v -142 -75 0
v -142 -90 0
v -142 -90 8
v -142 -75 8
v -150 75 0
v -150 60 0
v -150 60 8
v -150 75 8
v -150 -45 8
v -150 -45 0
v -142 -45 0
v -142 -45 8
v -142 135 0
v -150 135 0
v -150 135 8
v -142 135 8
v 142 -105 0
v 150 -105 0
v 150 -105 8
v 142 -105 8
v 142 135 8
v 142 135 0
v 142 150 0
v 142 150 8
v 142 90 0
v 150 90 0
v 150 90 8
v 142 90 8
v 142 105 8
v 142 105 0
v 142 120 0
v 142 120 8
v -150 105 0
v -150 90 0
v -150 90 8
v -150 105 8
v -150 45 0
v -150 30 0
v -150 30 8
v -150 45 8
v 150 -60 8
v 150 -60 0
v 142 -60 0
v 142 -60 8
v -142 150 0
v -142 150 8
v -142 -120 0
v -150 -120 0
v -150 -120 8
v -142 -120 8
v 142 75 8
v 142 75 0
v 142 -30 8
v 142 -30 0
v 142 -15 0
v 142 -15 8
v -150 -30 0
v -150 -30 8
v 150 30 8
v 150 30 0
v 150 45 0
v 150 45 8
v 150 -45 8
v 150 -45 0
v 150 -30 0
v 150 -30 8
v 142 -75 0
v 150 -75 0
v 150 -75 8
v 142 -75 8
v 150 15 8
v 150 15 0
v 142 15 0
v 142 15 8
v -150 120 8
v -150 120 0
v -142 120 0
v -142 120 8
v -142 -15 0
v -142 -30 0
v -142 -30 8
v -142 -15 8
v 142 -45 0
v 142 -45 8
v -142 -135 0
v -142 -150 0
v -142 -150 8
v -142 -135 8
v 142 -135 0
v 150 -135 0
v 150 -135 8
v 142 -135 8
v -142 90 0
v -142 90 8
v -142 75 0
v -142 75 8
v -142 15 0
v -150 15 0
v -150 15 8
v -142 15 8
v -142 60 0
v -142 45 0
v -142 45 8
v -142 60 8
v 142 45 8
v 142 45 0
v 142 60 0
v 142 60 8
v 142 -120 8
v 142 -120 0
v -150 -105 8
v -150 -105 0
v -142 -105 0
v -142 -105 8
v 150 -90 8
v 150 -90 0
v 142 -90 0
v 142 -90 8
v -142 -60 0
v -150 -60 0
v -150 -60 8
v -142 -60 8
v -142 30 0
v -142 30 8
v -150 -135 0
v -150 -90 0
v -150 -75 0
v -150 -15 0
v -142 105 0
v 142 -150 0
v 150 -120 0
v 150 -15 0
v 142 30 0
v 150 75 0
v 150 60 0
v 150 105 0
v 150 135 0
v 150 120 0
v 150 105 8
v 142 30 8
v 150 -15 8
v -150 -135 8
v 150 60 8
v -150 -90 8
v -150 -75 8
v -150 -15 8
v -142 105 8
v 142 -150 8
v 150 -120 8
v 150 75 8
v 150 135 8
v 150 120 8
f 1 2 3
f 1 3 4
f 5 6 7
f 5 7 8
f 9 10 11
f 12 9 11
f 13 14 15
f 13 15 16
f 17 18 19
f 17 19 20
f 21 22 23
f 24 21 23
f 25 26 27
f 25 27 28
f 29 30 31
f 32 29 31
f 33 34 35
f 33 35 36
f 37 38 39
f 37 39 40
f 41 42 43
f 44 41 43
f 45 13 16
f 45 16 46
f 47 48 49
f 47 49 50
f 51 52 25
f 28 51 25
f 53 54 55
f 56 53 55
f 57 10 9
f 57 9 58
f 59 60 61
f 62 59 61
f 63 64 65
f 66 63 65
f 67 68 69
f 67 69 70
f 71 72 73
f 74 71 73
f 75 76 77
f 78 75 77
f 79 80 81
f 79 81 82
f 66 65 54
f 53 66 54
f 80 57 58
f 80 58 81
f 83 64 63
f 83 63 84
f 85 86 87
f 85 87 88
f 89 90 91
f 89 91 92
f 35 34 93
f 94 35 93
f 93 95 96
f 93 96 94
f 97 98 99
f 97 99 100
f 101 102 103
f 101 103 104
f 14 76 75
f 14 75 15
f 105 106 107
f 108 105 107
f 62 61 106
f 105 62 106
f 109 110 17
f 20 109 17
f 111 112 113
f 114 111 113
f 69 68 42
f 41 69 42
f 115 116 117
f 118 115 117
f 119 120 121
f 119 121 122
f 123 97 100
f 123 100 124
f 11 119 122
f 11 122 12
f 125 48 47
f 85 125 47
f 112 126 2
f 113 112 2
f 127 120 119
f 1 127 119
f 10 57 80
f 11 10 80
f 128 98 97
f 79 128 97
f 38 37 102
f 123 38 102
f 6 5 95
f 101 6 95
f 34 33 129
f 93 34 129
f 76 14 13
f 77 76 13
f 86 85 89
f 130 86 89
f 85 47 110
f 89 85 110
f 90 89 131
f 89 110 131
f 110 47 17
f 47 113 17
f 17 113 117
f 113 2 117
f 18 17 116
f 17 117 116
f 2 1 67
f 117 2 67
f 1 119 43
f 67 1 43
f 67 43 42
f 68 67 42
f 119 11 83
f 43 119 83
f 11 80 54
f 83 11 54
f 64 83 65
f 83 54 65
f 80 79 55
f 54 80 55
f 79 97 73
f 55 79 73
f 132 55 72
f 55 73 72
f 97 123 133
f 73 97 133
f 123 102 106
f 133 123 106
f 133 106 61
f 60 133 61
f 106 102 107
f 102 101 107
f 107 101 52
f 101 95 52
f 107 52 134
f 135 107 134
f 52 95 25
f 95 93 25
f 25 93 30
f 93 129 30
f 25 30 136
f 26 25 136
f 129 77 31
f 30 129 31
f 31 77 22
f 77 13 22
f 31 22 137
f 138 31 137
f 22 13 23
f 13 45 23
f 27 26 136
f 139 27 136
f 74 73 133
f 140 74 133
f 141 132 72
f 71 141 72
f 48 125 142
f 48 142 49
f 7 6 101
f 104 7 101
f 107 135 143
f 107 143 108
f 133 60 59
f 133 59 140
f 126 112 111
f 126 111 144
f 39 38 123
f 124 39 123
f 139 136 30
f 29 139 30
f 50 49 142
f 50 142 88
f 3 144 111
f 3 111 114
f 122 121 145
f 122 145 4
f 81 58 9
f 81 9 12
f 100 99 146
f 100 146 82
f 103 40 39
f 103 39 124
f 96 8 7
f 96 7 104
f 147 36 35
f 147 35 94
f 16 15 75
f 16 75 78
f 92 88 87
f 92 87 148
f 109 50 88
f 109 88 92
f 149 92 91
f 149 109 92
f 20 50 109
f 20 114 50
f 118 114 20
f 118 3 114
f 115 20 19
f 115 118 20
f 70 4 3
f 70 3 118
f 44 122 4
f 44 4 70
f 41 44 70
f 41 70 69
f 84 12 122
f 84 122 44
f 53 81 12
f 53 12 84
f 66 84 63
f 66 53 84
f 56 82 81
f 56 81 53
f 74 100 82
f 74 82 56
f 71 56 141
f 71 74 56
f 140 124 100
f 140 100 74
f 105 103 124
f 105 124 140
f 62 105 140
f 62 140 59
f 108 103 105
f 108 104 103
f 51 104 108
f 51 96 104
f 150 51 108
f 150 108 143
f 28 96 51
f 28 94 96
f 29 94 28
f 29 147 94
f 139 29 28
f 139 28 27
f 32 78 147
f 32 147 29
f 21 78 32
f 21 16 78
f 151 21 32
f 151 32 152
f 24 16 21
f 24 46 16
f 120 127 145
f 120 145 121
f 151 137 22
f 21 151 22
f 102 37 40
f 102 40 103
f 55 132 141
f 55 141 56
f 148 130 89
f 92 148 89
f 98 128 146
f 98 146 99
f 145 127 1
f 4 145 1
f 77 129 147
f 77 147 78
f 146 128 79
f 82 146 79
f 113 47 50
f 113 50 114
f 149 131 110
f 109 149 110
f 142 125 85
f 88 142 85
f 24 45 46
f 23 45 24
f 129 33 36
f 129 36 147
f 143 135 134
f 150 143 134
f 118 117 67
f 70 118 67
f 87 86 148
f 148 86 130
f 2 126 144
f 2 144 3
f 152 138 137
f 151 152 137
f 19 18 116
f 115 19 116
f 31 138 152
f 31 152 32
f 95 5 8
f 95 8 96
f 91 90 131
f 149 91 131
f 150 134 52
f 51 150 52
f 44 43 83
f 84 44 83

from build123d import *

# Parameters (mm, degrees)
ESQUISSE1_W             = 300
ESQUISSE1_H             = 300
BOSS_EXTRU_1_DEPTH      = 8
ESQUISSE3_W             = 8
ESQUISSE3_H             = 15
ENL_V_MAT_EXTRU_4_DEPTH = 213.282830205


with BuildPart() as part:
    # Esquisse1 → Boss.-Extru.1 (new body)
    with BuildSketch(Plane.XY):
        Rectangle(ESQUISSE1_W, ESQUISSE1_H)
    extrude(amount=BOSS_EXTRU_1_DEPTH)

    # Esquisse3 → Enlèv. mat.-Extru.4 (cut, through all)
    with BuildSketch(Plane.XY):
        with Locations((-146, -22.5)):
            Rectangle(ESQUISSE3_W, ESQUISSE3_H)
        with Locations((-146, -52.5)):
            Rectangle(ESQUISSE3_W, ESQUISSE3_H)
        with Locations((-146, -82.5)):
            Rectangle(ESQUISSE3_W, ESQUISSE3_H)
        with Locations((-146, -112.5)):
            Rectangle(ESQUISSE3_W, ESQUISSE3_H)
        with Locations((-146, -142.5)):
            Rectangle(ESQUISSE3_W, ESQUISSE3_H)
        with Locations((-146, 52.5)):
            Rectangle(ESQUISSE3_W, ESQUISSE3_H)
        with Locations((-146, 142.5)):
            Rectangle(ESQUISSE3_W, ESQUISSE3_H)
        with Locations((-146, 112.5)):
            Rectangle(ESQUISSE3_W, ESQUISSE3_H)
        with Locations((-146, 82.5)):
            Rectangle(ESQUISSE3_W, ESQUISSE3_H)
        with Locations((-146, 22.5)):
            Rectangle(ESQUISSE3_W, ESQUISSE3_H)
    enl_v_mat_extru_4 = extrude(amount=ENL_V_MAT_EXTRU_4_DEPTH, mode=Mode.SUBTRACT)

    # Symétrie1: Enlèv. mat.-Extru.4 across plane
    add(enl_v_mat_extru_4.mirror(Plane(origin=(0, 0, 0), x_dir=(0, 0, 1), z_dir=(1, 0, 0))), mode=Mode.SUBTRACT)


solid = part.part
